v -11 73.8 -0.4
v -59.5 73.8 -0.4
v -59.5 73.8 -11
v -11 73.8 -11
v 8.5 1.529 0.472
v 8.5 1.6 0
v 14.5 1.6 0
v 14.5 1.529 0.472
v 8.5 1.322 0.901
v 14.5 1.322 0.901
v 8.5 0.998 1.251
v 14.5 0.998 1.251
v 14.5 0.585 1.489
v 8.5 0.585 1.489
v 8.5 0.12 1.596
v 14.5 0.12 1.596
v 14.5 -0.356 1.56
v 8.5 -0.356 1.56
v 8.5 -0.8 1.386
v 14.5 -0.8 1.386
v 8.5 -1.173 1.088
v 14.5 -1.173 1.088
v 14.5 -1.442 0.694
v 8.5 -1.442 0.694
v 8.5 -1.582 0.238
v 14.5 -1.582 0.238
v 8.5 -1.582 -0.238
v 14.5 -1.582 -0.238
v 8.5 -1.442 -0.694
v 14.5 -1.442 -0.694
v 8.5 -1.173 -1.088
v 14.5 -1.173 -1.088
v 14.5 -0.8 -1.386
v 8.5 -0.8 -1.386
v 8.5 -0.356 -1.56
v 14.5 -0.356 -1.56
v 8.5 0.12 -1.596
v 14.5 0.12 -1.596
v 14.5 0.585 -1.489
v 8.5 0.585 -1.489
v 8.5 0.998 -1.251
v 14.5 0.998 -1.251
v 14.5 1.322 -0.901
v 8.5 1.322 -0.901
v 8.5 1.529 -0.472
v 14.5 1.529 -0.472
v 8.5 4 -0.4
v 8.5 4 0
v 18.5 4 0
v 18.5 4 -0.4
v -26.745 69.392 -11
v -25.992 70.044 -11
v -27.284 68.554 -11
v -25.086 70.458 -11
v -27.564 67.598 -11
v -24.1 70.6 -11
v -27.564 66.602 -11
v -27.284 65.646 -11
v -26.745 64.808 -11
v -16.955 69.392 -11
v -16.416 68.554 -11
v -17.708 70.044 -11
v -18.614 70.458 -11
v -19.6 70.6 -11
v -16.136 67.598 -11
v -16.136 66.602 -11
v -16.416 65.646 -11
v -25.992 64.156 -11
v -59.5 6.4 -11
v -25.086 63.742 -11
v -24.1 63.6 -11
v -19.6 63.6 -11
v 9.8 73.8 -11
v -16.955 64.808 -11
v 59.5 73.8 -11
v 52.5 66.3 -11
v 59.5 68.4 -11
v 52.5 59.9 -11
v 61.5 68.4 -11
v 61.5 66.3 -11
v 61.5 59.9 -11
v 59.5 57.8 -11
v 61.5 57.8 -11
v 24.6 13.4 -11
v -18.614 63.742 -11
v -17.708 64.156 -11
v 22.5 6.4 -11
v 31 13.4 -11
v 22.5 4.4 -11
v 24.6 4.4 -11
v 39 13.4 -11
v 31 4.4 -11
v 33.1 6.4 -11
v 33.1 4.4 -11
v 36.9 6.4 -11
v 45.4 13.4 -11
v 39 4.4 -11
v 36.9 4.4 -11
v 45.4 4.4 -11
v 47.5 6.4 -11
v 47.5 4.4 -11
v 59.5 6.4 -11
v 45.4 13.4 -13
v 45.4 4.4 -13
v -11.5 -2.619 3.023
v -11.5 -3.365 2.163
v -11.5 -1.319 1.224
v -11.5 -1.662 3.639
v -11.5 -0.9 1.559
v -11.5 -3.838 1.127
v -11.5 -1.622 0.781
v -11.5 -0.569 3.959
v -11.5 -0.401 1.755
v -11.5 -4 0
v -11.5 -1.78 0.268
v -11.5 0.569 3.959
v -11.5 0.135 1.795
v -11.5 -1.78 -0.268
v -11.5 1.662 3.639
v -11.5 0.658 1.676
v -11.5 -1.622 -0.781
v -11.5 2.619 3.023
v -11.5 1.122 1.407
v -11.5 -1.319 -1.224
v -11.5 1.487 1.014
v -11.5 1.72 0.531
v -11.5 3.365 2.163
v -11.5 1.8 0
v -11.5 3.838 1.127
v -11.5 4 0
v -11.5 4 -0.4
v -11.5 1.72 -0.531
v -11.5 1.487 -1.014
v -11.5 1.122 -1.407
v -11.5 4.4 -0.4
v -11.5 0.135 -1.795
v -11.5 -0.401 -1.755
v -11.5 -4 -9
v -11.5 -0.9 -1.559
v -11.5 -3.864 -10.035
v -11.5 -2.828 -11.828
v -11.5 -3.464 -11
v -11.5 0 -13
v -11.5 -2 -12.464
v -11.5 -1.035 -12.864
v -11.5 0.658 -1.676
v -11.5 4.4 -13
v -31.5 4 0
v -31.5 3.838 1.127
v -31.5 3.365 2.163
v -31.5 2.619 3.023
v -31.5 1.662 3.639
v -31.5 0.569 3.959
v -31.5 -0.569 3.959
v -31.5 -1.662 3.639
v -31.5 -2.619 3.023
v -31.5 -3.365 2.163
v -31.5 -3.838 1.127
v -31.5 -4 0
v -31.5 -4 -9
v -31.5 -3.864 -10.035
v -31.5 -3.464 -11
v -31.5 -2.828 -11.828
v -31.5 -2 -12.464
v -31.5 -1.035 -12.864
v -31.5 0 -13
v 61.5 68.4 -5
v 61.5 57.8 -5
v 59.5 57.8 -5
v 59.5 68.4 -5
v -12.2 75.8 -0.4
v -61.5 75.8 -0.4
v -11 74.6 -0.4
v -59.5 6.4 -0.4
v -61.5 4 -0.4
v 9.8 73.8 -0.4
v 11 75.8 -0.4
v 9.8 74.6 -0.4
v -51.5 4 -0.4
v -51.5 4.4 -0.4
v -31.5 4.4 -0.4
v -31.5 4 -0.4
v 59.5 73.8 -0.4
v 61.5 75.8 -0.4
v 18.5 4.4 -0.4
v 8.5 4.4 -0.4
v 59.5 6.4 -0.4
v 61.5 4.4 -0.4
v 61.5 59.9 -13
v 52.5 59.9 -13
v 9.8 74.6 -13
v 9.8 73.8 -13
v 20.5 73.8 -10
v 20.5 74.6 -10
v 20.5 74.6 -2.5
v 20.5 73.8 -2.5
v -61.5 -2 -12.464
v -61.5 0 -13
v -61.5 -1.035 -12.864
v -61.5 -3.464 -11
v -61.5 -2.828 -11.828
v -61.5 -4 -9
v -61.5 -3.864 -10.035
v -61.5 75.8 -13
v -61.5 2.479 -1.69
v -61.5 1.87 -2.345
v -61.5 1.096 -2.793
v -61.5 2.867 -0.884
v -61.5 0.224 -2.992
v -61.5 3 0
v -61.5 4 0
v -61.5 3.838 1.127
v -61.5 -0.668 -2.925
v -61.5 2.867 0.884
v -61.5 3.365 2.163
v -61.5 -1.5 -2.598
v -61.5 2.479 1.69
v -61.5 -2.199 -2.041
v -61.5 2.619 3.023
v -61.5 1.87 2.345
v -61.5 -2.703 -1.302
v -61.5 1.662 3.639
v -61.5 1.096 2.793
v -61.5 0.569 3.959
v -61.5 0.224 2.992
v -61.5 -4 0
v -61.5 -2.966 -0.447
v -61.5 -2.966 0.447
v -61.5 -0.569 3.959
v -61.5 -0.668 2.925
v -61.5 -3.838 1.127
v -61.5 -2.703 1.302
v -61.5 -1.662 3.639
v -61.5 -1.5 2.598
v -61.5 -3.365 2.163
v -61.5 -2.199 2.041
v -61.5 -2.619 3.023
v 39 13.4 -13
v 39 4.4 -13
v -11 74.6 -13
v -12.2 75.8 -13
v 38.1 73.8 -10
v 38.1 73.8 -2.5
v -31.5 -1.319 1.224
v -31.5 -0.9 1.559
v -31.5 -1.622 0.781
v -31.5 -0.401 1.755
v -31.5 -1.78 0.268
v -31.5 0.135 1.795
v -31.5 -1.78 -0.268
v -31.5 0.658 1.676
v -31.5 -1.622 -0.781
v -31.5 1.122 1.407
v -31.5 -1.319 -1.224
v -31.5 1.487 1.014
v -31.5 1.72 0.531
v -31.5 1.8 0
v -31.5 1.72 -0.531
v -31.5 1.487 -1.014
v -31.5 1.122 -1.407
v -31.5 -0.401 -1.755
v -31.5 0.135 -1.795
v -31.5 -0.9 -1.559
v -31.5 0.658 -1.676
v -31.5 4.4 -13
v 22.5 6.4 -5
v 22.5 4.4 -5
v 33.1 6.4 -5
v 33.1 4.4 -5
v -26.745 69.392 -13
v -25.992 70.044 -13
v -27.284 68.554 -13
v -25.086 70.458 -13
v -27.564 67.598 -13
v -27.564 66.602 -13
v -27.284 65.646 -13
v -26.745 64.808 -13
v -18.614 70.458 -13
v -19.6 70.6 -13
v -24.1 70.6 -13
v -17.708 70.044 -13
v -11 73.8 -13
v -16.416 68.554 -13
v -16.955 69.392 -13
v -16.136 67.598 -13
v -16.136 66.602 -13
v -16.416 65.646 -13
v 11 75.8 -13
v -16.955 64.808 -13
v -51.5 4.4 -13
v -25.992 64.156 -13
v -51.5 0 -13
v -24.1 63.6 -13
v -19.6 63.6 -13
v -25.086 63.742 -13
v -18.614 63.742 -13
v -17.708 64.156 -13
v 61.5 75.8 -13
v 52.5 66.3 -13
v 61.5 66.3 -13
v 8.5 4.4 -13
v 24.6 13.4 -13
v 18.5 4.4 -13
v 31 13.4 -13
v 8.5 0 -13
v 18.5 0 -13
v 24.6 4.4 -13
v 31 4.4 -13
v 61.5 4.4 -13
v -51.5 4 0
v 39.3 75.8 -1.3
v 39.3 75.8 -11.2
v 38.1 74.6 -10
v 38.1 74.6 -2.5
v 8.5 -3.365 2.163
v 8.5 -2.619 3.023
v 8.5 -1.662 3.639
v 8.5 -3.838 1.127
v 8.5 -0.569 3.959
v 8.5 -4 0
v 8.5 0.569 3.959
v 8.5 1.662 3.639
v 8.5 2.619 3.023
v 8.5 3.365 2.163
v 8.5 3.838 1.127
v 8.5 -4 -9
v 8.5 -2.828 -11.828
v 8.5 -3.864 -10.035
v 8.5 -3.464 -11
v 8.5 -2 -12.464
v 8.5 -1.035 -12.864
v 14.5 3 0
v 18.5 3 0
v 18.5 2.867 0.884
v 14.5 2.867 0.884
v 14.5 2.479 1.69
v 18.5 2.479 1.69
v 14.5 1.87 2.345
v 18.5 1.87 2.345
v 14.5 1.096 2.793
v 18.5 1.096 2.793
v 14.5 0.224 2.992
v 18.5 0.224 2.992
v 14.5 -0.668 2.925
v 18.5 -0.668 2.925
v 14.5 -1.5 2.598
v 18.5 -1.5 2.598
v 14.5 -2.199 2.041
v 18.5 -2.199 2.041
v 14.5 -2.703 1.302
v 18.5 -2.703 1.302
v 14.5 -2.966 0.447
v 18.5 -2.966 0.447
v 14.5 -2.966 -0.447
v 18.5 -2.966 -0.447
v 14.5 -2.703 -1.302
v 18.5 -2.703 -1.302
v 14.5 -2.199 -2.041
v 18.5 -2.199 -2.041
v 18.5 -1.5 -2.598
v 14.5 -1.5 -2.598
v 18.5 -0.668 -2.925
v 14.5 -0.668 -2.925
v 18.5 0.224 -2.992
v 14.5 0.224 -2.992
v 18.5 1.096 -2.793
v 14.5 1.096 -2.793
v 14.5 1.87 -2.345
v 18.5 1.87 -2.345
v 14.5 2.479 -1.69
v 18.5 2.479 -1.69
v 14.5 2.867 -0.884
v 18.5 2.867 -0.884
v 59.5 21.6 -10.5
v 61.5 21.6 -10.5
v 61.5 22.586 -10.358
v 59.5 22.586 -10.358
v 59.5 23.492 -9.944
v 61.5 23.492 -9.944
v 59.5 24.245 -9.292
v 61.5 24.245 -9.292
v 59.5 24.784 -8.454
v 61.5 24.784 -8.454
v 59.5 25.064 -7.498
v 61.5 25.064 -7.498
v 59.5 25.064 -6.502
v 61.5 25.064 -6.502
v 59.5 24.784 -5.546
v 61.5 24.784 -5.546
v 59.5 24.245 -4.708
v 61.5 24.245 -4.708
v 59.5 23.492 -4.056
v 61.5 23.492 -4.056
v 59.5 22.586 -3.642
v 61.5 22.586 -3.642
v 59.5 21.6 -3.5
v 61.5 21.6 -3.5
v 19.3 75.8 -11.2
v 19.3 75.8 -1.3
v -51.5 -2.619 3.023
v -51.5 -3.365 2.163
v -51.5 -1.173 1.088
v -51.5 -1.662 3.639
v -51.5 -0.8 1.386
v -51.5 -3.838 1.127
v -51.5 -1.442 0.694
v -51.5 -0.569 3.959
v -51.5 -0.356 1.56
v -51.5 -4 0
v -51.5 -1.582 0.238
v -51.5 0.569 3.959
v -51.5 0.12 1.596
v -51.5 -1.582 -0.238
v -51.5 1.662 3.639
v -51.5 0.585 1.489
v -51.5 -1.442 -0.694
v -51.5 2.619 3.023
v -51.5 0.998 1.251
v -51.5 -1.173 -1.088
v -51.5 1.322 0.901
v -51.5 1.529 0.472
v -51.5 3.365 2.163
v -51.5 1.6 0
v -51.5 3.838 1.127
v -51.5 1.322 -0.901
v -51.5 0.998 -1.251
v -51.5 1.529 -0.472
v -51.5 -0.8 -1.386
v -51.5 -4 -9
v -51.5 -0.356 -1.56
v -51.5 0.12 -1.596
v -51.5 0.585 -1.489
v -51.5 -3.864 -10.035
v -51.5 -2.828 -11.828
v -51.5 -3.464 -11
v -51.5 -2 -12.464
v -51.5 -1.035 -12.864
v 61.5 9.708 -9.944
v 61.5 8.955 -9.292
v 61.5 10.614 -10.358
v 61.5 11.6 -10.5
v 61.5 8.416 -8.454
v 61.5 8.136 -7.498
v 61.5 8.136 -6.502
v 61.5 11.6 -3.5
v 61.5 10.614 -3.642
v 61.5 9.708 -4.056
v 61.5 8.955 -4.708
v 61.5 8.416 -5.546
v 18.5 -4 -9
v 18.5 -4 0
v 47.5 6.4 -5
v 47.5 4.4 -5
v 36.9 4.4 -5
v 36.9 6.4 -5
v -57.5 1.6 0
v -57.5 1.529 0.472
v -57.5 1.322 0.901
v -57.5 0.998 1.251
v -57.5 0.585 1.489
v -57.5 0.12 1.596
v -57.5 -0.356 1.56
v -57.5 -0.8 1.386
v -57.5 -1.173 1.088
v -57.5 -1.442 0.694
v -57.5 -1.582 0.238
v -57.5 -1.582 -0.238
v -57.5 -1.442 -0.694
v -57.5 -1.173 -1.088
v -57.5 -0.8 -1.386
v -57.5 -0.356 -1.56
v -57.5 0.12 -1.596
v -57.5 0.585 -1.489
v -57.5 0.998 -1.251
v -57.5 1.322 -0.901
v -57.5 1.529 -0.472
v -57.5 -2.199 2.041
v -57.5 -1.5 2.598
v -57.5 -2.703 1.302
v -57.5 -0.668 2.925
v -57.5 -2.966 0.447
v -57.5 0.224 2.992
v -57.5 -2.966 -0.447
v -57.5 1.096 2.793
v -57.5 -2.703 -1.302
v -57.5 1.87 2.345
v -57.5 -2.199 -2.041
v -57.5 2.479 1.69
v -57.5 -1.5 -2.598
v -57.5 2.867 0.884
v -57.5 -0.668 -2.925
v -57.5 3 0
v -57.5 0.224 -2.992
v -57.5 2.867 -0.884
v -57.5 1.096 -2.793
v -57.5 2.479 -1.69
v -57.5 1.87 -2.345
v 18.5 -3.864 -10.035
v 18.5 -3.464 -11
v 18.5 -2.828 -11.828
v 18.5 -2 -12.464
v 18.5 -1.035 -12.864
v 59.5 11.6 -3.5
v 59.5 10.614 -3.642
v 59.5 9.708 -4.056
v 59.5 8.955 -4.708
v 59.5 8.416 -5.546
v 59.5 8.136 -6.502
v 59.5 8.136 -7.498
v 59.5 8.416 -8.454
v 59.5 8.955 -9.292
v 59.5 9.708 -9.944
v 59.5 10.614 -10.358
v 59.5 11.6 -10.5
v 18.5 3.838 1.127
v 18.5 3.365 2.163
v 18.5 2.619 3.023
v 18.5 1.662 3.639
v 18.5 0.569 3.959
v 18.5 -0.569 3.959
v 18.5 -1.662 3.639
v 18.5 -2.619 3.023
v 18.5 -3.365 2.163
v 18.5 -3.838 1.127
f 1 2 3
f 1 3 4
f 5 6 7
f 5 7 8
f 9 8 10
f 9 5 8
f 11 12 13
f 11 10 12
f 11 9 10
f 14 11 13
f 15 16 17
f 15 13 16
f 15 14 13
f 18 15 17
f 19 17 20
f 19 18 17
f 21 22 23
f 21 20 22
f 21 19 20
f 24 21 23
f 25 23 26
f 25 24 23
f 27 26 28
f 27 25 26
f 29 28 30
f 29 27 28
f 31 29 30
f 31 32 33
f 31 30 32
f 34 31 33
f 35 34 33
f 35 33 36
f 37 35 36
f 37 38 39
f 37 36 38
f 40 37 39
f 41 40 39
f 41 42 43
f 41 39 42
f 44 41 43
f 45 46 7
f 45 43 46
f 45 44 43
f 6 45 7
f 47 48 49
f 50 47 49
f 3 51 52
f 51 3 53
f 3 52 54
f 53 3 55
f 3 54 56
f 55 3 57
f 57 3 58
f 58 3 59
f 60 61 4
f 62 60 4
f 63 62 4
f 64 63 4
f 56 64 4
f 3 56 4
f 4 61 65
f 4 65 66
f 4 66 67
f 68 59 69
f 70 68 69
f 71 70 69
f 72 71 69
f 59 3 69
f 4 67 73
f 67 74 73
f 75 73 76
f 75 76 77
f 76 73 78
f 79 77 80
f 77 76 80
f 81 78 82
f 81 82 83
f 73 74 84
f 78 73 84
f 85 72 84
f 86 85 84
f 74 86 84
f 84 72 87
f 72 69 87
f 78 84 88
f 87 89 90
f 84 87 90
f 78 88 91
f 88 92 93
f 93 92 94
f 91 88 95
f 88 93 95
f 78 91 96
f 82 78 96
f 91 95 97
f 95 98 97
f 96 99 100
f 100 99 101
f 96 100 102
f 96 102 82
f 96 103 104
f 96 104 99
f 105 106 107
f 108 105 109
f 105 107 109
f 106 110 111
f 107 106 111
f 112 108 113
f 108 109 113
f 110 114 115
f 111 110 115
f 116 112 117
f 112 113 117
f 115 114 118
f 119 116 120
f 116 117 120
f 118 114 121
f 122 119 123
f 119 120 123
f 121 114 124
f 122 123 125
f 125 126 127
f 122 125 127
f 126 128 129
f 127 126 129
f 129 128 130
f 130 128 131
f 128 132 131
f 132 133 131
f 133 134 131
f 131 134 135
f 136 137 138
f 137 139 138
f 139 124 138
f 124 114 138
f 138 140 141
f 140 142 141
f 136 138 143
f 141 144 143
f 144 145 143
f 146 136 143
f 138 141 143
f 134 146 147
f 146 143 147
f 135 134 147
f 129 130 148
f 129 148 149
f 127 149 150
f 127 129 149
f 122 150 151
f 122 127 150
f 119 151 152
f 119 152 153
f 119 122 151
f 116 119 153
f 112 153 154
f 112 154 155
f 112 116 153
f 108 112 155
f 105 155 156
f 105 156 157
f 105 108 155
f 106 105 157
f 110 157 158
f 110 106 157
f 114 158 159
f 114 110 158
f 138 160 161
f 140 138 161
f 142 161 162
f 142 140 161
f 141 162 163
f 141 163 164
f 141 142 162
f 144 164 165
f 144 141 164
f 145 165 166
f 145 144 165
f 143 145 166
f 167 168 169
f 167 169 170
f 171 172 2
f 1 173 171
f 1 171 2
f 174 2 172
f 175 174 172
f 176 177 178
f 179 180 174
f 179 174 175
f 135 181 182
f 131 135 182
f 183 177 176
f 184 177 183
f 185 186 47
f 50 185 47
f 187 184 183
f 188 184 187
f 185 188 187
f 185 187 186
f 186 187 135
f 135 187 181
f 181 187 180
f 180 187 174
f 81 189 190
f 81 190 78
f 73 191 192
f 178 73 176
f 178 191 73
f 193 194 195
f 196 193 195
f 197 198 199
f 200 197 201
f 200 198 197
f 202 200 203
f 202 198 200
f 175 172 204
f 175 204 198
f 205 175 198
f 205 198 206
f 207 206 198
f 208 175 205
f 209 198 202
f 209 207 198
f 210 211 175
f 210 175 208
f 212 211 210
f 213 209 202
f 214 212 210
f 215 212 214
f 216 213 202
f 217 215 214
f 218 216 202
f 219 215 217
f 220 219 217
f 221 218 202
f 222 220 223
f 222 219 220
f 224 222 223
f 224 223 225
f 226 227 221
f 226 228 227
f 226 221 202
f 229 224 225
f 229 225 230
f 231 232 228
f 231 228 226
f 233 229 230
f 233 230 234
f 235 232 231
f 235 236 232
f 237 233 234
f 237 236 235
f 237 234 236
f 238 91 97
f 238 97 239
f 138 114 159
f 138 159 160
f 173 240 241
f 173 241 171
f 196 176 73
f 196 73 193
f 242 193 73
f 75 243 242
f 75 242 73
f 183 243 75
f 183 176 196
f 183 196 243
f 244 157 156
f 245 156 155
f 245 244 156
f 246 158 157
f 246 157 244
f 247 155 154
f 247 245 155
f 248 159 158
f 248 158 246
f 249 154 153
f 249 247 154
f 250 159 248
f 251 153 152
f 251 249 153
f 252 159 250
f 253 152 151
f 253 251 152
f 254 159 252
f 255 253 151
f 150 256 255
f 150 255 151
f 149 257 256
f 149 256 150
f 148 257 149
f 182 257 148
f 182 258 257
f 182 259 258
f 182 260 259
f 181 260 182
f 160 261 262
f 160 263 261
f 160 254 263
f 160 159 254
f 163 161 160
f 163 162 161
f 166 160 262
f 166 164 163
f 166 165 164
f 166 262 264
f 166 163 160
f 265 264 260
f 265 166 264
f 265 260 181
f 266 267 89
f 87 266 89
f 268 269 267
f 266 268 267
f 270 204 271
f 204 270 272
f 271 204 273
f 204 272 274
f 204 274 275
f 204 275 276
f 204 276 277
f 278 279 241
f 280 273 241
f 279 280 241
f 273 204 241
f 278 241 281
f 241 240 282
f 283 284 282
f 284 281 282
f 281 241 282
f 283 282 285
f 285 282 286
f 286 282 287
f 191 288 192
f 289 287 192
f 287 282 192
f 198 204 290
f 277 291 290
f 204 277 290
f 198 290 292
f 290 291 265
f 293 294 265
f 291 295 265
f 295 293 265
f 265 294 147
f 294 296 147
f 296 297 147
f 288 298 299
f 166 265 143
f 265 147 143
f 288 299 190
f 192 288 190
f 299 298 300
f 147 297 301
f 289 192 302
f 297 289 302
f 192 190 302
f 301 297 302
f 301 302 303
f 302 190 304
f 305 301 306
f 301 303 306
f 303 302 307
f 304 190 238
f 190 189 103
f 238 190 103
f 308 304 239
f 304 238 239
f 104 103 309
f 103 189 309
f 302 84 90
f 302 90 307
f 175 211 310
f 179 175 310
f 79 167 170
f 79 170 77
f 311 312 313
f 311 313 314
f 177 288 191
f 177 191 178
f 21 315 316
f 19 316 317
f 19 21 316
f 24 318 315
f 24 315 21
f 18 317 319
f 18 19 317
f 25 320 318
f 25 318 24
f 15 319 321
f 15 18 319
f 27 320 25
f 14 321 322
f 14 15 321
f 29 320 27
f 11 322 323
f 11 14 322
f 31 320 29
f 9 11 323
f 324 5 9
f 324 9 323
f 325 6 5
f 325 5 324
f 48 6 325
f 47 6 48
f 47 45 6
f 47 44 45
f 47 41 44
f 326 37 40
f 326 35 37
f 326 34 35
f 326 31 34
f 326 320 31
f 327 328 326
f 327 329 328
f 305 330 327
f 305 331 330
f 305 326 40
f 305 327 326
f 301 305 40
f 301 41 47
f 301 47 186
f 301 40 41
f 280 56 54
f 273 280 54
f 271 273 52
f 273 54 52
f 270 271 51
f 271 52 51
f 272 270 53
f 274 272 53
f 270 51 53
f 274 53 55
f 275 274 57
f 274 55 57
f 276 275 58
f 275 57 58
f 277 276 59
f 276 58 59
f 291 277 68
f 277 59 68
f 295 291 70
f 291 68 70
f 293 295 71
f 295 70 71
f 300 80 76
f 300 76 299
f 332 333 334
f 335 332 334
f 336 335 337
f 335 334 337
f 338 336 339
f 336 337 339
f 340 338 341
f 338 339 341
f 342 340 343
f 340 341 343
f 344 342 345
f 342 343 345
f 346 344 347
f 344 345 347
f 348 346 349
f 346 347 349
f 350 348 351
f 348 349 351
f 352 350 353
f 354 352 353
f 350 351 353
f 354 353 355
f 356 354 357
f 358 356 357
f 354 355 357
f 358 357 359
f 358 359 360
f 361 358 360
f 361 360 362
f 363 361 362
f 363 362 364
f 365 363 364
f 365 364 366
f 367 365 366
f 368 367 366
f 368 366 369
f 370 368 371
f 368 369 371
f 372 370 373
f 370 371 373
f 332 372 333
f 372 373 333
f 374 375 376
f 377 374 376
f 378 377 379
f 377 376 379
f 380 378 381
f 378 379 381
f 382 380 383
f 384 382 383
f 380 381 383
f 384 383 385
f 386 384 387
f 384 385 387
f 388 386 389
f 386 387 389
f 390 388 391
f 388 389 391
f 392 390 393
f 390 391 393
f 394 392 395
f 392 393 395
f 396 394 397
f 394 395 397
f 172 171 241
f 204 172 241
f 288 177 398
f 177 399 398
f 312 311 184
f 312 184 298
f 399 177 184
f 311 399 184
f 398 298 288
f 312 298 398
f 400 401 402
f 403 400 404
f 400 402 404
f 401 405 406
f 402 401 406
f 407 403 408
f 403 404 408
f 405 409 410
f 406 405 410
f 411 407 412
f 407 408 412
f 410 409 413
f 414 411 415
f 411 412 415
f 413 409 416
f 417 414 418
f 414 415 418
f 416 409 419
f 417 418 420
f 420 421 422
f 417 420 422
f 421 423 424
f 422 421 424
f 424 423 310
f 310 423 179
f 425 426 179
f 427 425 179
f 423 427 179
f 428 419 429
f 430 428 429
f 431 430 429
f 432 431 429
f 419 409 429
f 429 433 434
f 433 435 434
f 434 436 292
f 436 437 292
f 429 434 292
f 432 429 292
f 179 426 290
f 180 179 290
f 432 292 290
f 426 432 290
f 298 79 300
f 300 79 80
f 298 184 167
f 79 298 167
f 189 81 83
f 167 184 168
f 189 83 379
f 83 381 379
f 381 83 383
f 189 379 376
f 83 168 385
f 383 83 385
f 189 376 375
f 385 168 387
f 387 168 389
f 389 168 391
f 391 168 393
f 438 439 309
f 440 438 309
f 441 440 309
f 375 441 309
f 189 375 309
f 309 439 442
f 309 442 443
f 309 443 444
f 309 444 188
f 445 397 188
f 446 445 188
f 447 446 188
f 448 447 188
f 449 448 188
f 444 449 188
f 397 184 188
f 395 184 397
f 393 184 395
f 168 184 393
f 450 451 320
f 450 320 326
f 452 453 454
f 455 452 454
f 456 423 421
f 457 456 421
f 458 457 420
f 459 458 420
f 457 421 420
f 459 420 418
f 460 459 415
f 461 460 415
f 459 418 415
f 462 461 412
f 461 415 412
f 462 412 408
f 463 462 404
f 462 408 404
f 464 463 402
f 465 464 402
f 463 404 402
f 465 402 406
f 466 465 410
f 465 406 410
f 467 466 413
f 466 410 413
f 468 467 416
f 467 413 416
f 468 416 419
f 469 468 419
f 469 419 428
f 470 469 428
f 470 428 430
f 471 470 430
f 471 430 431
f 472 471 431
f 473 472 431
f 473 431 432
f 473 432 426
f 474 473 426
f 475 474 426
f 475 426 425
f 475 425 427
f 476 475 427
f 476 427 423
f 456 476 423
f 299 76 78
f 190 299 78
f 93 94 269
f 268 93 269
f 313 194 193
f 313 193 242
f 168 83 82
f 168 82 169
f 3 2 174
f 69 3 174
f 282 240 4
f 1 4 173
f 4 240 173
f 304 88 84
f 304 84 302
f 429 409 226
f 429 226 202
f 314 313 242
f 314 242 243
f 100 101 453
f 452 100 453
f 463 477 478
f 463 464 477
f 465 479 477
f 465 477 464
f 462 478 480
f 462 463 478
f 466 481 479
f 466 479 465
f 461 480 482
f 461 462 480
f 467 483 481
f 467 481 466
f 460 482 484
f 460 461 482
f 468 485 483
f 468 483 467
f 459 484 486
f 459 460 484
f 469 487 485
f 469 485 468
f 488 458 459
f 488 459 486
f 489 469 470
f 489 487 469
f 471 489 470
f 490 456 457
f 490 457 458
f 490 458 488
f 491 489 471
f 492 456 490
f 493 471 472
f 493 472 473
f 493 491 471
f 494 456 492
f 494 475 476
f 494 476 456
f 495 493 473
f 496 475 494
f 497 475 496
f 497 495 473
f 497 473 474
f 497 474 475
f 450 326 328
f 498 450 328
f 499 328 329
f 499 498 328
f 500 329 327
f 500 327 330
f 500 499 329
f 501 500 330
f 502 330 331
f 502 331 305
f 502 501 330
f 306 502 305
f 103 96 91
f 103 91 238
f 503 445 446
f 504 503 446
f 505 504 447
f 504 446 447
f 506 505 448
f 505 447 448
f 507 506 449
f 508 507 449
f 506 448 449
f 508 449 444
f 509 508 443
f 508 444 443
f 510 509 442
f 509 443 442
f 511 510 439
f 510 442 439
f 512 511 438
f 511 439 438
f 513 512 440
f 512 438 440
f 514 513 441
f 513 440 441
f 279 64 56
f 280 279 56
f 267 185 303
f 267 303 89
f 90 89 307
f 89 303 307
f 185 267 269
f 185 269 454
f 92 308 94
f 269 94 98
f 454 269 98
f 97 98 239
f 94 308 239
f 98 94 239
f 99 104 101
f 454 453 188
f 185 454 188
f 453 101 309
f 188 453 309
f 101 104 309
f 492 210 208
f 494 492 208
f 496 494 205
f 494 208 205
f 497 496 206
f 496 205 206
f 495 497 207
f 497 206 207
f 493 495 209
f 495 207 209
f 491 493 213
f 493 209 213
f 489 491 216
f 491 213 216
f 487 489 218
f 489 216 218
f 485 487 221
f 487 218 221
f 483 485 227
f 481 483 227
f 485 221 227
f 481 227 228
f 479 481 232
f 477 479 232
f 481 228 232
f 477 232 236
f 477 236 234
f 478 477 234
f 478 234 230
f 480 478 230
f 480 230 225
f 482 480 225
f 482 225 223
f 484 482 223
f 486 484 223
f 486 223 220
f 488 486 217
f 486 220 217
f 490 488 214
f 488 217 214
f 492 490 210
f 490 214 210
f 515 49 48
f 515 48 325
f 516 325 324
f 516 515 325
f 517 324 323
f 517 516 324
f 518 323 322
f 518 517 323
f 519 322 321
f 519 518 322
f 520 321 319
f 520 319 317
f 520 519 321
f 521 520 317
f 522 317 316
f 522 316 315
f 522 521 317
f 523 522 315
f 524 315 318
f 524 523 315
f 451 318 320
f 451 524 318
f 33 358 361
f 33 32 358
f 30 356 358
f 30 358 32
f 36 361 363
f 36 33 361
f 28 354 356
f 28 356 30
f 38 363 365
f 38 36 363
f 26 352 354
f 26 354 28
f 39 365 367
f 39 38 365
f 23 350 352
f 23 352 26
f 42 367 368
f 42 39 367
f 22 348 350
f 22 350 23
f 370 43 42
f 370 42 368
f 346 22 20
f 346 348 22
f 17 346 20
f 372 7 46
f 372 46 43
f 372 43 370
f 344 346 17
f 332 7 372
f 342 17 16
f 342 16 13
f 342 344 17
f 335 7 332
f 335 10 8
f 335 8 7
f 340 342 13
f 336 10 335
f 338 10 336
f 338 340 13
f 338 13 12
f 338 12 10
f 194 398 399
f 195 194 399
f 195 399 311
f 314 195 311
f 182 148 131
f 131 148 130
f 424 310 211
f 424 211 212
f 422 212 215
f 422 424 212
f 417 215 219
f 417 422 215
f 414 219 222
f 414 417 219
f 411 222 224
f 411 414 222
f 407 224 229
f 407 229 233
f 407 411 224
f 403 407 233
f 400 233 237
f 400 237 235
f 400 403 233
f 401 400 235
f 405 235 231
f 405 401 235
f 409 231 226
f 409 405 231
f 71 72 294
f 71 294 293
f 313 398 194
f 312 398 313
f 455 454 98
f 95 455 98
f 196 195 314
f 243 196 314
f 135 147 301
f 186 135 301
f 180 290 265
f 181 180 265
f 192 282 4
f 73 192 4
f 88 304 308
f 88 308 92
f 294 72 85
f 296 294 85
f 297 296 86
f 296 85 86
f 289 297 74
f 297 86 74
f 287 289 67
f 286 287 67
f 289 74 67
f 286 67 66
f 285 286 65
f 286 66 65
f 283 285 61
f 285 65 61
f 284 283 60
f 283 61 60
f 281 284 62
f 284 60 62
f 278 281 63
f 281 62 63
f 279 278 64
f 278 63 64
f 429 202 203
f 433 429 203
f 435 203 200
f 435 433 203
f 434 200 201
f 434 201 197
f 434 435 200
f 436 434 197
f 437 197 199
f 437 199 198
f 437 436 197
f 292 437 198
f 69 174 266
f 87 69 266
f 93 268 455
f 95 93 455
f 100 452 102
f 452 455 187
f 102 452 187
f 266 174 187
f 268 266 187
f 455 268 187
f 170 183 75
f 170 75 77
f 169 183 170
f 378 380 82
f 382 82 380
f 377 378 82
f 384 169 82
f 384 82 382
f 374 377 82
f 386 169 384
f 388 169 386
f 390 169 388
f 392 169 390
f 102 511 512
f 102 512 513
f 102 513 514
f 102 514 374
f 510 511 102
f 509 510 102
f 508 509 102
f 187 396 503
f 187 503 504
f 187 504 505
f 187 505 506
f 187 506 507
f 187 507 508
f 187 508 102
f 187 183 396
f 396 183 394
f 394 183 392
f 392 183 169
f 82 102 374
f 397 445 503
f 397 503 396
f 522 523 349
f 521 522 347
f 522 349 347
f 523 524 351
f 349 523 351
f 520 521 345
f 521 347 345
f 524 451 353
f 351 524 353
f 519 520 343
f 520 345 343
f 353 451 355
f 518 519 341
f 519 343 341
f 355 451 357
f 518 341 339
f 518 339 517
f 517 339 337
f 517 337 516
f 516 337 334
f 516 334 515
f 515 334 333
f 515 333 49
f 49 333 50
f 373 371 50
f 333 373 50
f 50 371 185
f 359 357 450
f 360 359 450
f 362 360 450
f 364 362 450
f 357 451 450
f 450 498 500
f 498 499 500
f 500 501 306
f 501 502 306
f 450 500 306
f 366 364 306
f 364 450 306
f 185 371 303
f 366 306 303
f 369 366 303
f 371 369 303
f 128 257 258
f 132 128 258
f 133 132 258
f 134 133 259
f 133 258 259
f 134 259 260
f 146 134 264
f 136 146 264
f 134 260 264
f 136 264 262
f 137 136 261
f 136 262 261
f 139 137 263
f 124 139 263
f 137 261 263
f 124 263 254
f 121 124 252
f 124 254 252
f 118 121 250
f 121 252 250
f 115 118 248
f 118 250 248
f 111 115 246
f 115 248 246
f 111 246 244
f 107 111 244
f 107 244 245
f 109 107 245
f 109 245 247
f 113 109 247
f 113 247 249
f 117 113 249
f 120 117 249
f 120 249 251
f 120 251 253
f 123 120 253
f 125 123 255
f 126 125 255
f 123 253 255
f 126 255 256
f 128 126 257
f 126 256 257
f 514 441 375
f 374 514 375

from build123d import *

# Parameters (mm, degrees)
SKETCH035_R     = 1.6
PAD_DEPTH       = 61.5
PAD_DEPTH_BACK  = 61.5
SKETCH037_W     = 8.4
SKETCH037_H     = 43
SKETCH037_H_2   = 20
POCKET007_DEPTH = 17.001
SKETCH038_R     = 3
POCKET008_DEPTH = 4
SKETCH039_R     = 3
POCKET009_DEPTH = 4
SKETCH041_W     = 67.4
SKETCH041_H     = 119
POCKET011_DEPTH = 11
POCKET012_DEPTH = 2
SKETCH043_W     = 7.5
SKETCH043_H     = 17.6
SKETCH043_W_2   = 15
SKETCH043_H_2   = 20.8
POCKET013_DEPTH = 2
POCKET014_DEPTH = 9
POCKET015_DEPTH = 9
CHAMFER_SIZE    = 1.2
SKETCH062_R     = 1.8
POCKET020_DEPTH = 20
SKETCH071_W     = 71.8
SKETCH071_H     = 123
POCKET026_DEPTH = 0.4


with BuildPart() as part:
    # Sketch035 → Pad (new body, two sides)
    with BuildSketch(Plane.YZ) as pad_sk:
        with BuildLine():
            Line((75.8, 0), (75.8, -13))
            Line((75.8, -13), (0, -13))
            ThreePointArc((-4, -9), (-2.828427, -11.828427), (0, -13))
            Line((-4, 0), (-4, -9))
            ThreePointArc((4, 0), (0, 4), (-4, 0))
            Line((4, 0), (4.4, 0))
            Line((4.4, 0), (75.8, 0))
        make_face()
        Circle(SKETCH035_R, mode=Mode.SUBTRACT)
    extrude(amount=PAD_DEPTH)
    extrude(pad_sk.sketch, amount=-PAD_DEPTH_BACK)

    # Sketch037 (on Face4 of Pad) → Pocket007 (cut, through all)
    with BuildSketch(Plane.YX.offset(13)):
        with Locations((0.2, 40)):
            Rectangle(SKETCH037_W, SKETCH037_H)
        with Locations((0.2, -1.5)):
            Rectangle(SKETCH037_W, SKETCH037_H_2)
        with Locations((0.2, -41.5)):
            Rectangle(SKETCH037_W, SKETCH037_H_2)
    extrude(amount=-POCKET007_DEPTH, mode=Mode.SUBTRACT)

    # Sketch038 (on Face22 of Pocket007) → Pocket008 (cut)
    with BuildSketch(Plane.YZ.offset(18.5)):
        Circle(SKETCH038_R)
    extrude(amount=-POCKET008_DEPTH, mode=Mode.SUBTRACT)

    # Sketch039 (on Face2 of Pocket008) → Pocket009 (cut)
    with BuildSketch(Plane(origin=(-61.5, 0, 0), x_dir=(0, 1, 0), z_dir=(-1, 0, 0))):
        Circle(SKETCH039_R)
    extrude(amount=-POCKET009_DEPTH, mode=Mode.SUBTRACT)

    # Sketch041 (on Face3 of Pocket009) → Pocket011 (cut)
    with BuildSketch(Plane(origin=(0, 0, 0), x_dir=(0, -1, 0), z_dir=(0, 0, 1))):
        with Locations((-40.1, 0)):
            Rectangle(SKETCH041_W, SKETCH041_H)
    extrude(amount=-POCKET011_DEPTH, mode=Mode.SUBTRACT)

    # Sketch042 (on Face31 of Pocket011) → Pocket012 (cut)
    with BuildSketch(Plane(origin=(0, 0, -11), x_dir=(0, -1, 0), z_dir=(0, 0, 1))):
        with BuildLine():
            ThreePointArc((-63.6, -19.6), (-67.1, -16.1), (-70.6, -19.6))
            Line((-70.6, -19.6), (-70.6, -24.1))
            ThreePointArc((-70.6, -24.1), (-67.1, -27.6), (-63.6, -24.1))
            Line((-63.6, -19.6), (-63.6, -24.1))
        make_face()
    extrude(amount=-POCKET012_DEPTH, mode=Mode.SUBTRACT)

    # Sketch043 (on Face7 of Pocket012) → Pocket013 (cut)
    with BuildSketch(Plane.ZX.offset(75.8)):
        with Locations((-6.25, 29.3)):
            Rectangle(SKETCH043_W, SKETCH043_H)
        with Locations((-5.5, -0.6)):
            Rectangle(SKETCH043_W_2, SKETCH043_H_2)
    extrude(amount=-POCKET013_DEPTH, mode=Mode.SUBTRACT)

    # Sketch044 (on Face19 of Pocket013) → Pocket014 (cut)
    with BuildSketch(Plane.YZ.offset(61.5)):
        with BuildLine():
            ThreePointArc((11.6, -3.5), (8.1, -7), (11.6, -10.5))
            Line((11.6, -10.5), (21.6, -10.5))
            ThreePointArc((21.6, -10.5), (25.1, -7), (21.6, -3.5))
            Line((11.6, -3.5), (21.6, -3.5))
        make_face()
        Polygon((57.8, -5), (68.4, -5), (68.4, -11), (66.3, -11), (66.3, -13), (59.9, -13), (59.9, -11), (57.8, -11), align=None)
    extrude(amount=-POCKET014_DEPTH, mode=Mode.SUBTRACT)

    # Sketch045 (on Face20 of Pocket014) → Pocket015 (cut)
    with BuildSketch(Plane(origin=(0, 4.4, 0), x_dir=(0, 0, -1), z_dir=(0, -1, 0))):
        Polygon((5, 33.1), (5, 22.5), (11, 22.5), (11, 24.6), (13, 24.6), (13, 31), (11, 31), (11, 33.1), align=None)
        Polygon((5, 36.9), (11, 36.9), (11, 39), (13, 39), (13, 45.4), (11, 45.4), (11, 47.5), (5, 47.5), align=None)
    extrude(amount=-POCKET015_DEPTH, mode=Mode.SUBTRACT)

    # Chamfer
    chamfer_edges = [part.edges().sort_by_distance(p)[0] for p in [
        (9.8, 75.8, -6.5),
        (-11, 75.8, -6.5),
        (38.1, 75.8, -6.25),
        (29.3, 75.8, -2.5),
        (20.5, 75.8, -6.25),
        (29.3, 75.8, -10),
    ]]
    chamfer(chamfer_edges, length=CHAMFER_SIZE)

    # Sketch062 (on Face29 of Chamfer) → Pocket020 (cut)
    with BuildSketch(Plane(origin=(-31.5, 0, 0), x_dir=(0, 1, 0), z_dir=(-1, 0, 0))):
        Circle(SKETCH062_R)
    extrude(amount=-POCKET020_DEPTH, mode=Mode.SUBTRACT)

    # Sketch071 (on Face1 of Pocket020) → Pocket026 (cut)
    with BuildSketch(Plane(origin=(0, 0, 0), x_dir=(0, -1, 0), z_dir=(0, 0, 1))):
        with Locations((-39.9, 0)):
            Rectangle(SKETCH071_W, SKETCH071_H)
    extrude(amount=-POCKET026_DEPTH, mode=Mode.SUBTRACT)


solid = part.part
